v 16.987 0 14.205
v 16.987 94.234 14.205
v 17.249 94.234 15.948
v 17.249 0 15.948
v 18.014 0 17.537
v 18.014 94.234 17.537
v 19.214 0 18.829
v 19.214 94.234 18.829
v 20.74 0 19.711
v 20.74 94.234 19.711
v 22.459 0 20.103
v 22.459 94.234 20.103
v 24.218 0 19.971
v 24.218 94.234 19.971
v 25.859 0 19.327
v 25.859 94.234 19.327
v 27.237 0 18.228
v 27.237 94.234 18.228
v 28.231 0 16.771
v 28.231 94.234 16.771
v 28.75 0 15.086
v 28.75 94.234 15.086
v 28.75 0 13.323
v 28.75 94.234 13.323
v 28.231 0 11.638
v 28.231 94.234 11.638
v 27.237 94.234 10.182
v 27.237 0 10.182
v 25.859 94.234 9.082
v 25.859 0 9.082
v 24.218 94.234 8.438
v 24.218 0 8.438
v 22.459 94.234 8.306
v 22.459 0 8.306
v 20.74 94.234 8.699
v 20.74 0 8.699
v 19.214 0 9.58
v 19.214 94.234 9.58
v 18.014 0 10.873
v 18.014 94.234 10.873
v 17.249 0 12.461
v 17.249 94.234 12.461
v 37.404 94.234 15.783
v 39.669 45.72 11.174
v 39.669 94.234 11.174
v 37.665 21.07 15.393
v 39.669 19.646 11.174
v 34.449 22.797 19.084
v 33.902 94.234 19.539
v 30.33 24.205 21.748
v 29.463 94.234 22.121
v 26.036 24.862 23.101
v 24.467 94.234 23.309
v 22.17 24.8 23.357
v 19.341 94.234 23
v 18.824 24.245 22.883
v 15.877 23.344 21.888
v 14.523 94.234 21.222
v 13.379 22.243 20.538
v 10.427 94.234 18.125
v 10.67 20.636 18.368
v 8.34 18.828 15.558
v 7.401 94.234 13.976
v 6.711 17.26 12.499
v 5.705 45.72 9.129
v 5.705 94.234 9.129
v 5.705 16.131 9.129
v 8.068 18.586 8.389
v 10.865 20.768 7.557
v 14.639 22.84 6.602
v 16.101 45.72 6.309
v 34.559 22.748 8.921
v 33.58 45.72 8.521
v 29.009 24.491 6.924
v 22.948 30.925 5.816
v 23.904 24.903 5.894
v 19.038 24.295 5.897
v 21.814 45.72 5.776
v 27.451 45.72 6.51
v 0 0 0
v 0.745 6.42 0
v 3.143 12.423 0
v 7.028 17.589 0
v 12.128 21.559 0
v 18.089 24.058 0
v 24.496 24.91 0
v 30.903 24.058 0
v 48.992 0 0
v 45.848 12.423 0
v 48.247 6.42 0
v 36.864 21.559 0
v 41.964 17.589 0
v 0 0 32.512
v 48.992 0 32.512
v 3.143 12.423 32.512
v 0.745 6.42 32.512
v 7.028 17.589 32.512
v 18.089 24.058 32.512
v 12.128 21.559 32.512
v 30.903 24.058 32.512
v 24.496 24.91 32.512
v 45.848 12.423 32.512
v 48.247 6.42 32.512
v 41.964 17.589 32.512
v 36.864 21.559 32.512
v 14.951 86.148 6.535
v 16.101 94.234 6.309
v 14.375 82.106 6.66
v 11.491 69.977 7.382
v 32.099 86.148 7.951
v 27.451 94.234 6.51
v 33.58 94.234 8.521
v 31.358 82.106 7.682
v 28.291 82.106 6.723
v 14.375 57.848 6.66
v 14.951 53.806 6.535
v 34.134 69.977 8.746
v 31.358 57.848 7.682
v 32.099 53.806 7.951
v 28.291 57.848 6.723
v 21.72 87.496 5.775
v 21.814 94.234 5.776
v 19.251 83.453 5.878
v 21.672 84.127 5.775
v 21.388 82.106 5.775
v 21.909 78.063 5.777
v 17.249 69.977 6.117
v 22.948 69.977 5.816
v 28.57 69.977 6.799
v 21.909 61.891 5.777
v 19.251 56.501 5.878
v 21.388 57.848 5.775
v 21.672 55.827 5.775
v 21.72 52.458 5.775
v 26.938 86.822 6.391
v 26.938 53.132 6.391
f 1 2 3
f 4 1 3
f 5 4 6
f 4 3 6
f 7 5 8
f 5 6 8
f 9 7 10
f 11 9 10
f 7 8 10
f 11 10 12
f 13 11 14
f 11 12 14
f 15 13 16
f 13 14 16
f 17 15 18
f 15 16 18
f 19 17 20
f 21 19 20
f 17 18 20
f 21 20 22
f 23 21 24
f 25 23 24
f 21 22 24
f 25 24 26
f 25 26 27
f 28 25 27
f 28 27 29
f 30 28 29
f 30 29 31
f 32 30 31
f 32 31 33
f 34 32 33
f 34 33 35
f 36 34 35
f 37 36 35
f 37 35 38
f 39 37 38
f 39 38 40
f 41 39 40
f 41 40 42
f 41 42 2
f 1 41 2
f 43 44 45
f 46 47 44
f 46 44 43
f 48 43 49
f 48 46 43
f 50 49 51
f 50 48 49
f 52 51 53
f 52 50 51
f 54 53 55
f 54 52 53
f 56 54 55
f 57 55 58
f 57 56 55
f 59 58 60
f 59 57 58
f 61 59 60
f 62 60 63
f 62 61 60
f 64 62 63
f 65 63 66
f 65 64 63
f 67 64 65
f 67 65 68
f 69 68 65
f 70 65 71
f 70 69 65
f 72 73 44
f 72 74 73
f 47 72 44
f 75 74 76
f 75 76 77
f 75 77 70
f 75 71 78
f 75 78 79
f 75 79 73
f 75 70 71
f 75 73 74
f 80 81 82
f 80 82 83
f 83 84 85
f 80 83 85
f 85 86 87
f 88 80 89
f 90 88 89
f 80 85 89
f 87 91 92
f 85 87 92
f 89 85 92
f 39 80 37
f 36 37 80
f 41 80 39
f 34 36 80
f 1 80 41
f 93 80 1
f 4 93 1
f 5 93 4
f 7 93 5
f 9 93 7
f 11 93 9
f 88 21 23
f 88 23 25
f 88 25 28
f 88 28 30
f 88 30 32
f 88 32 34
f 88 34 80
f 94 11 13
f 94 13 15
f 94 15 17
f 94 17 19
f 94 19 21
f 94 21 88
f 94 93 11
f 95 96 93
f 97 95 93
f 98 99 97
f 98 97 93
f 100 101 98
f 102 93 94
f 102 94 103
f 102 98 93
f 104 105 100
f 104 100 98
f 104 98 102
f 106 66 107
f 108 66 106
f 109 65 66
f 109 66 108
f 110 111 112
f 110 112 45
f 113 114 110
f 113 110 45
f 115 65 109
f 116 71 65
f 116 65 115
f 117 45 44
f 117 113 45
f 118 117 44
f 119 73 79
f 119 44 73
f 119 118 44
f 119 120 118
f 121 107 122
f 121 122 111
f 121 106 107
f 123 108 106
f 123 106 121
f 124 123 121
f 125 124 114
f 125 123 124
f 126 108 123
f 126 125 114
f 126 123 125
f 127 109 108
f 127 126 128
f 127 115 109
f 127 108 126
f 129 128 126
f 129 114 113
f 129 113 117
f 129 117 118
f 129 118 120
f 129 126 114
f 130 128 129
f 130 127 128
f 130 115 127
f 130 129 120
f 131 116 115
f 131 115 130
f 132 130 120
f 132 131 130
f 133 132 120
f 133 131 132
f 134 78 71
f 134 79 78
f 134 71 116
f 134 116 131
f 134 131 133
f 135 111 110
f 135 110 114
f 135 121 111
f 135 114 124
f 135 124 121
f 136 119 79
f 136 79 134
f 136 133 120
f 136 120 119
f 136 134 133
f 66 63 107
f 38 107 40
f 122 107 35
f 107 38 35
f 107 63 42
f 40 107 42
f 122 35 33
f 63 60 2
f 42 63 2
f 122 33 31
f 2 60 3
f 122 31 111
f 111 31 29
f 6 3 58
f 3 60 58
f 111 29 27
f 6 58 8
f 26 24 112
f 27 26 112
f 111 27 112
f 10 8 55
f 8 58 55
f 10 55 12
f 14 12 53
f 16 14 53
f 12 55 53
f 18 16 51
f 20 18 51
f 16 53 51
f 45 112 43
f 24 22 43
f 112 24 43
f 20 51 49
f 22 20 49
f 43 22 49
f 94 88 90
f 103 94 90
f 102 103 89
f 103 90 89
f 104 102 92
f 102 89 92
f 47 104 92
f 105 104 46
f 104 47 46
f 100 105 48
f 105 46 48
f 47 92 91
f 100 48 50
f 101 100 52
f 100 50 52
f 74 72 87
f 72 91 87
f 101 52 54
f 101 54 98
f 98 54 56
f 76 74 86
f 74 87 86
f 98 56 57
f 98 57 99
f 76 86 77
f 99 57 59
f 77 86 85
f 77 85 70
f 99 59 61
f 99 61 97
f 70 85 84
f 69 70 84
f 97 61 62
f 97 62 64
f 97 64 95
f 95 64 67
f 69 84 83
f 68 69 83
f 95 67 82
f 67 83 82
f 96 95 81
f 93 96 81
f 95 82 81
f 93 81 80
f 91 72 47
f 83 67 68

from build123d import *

# Parameters (mm, degrees)
F1_DEPTH = 32.512
F3_DEPTH = 45.72
F4_DEPTH = 48.514
F5_R     = 5.9149018799
F6_DEPTH = 140.208


with BuildPart() as f1:
    # F0 (on Top) → F1 (new body)
    with BuildSketch(Plane.XY):
        with BuildLine():
            Line((0, 0), (48.9916317165, 0))
            ThreePointArc((48.9916317165, 0), (24.4958158582, 24.9102240026), (0, 0))
        make_face()
    extrude(amount=F1_DEPTH)

    # F2 (on face) → F3 (join)
    with BuildSketch(Plane.XZ):
        with BuildLine():
            add(Edge.make_bspline(
                [(5.7047577575, 9.1287503019), (11.4960234604, 7.3019890664), (23.0785548663, 3.6484665953), (34.1390326611, 8.6653472163), (39.6692715585, 11.1737875268)],
                knots=[0, 0, 0, 0, 0.5, 1, 1, 1, 1], degree=3))
            ThreePointArc((39.6692715585, 11.1737875268), (21.8927314115, 23.3429330858), (5.7047577575, 9.1287503019))
        make_face()
    extrude(amount=-F3_DEPTH)

    # F4 (add): a face of the model
    f4_faces = [f1.faces().sort_by_distance(p)[0] for p in [
        (22.4499268114, 45.72, 14.0888929688),
    ]]
    extrude(f4_faces, amount=F4_DEPTH)

    # F5 (on face) → F6 (cut)
    with BuildSketch(Plane(origin=(0, 94.234, 0), x_dir=(-1, 0, 0), z_dir=(0, 1, 0))):
        with Locations((-22.9014139622, 14.2046744004)):
            Circle(F5_R)
    extrude(amount=-F6_DEPTH, mode=Mode.SUBTRACT)


solid = f1.part
